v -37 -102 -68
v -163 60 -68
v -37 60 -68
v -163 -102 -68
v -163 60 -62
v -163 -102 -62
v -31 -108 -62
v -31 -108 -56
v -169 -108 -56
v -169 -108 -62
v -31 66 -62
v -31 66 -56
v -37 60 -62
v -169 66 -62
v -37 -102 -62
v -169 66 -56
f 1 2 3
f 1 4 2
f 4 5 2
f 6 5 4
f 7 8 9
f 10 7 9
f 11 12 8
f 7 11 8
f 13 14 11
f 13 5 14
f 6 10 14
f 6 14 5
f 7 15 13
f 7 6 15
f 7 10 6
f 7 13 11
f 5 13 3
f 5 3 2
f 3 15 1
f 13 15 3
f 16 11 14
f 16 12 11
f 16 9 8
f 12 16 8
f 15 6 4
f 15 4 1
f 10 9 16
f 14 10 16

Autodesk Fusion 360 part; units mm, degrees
sketch "Boceto1" plane through (0, 0, -56) normal (0, 0, -1) x (1, 0, 0)
  line L0 (-169, 102) -> (-31, 102)
  line L1 (-31, 102) -> (-31, 108)
  line L2 (-31, 108) -> (-169, 108)
  line L3 (-169, 108) -> (-169, 102)
  line L4 (-169, 108) -> (-31, 108)
  line L5 (-31, 108) -> (-31, -66)
  line L6 (-31, -66) -> (-169, -66)
  line L7 (-169, -66) -> (-169, 108)
  line L8 (-169, 102) -> (-169, -60)
  line L9 (-169, -66) -> (-31, -66)
  line L10 (-31, -60) -> (-31, 102)
sketch "Boceto2" plane through (0, 0, -62) normal (0, 0, -1) x (1, 0, 0)
  line L0 (-169, -66) -> (-31, -66)
  line L1 (-31, -66) -> (-31, 108)
  line L2 (-31, 108) -> (-169, 108)
  line L3 (-169, 108) -> (-169, -66)
  line L4 (-163, 102) -> (-37, 102)
  line L5 (-37, 102) -> (-37, -60)
  line L6 (-37, -60) -> (-163, -60)
  line L7 (-163, -60) -> (-163, 102)
  line L8 (-163, -60) -> (-163, 102)
  line L9 (-37, 102) -> (-37, -60)
  line L10 (-175, 102) -> (-25, 102)
  line L11 (-25, -60) -> (-175, -60)
extrude "Extruir1" add sketch "Boceto1" along normal blind 6
extrude "Extruir2" add sketch "Boceto2" along normal blind 6 contours L4 L5 L6 L7 L8 L9 L10 L11
